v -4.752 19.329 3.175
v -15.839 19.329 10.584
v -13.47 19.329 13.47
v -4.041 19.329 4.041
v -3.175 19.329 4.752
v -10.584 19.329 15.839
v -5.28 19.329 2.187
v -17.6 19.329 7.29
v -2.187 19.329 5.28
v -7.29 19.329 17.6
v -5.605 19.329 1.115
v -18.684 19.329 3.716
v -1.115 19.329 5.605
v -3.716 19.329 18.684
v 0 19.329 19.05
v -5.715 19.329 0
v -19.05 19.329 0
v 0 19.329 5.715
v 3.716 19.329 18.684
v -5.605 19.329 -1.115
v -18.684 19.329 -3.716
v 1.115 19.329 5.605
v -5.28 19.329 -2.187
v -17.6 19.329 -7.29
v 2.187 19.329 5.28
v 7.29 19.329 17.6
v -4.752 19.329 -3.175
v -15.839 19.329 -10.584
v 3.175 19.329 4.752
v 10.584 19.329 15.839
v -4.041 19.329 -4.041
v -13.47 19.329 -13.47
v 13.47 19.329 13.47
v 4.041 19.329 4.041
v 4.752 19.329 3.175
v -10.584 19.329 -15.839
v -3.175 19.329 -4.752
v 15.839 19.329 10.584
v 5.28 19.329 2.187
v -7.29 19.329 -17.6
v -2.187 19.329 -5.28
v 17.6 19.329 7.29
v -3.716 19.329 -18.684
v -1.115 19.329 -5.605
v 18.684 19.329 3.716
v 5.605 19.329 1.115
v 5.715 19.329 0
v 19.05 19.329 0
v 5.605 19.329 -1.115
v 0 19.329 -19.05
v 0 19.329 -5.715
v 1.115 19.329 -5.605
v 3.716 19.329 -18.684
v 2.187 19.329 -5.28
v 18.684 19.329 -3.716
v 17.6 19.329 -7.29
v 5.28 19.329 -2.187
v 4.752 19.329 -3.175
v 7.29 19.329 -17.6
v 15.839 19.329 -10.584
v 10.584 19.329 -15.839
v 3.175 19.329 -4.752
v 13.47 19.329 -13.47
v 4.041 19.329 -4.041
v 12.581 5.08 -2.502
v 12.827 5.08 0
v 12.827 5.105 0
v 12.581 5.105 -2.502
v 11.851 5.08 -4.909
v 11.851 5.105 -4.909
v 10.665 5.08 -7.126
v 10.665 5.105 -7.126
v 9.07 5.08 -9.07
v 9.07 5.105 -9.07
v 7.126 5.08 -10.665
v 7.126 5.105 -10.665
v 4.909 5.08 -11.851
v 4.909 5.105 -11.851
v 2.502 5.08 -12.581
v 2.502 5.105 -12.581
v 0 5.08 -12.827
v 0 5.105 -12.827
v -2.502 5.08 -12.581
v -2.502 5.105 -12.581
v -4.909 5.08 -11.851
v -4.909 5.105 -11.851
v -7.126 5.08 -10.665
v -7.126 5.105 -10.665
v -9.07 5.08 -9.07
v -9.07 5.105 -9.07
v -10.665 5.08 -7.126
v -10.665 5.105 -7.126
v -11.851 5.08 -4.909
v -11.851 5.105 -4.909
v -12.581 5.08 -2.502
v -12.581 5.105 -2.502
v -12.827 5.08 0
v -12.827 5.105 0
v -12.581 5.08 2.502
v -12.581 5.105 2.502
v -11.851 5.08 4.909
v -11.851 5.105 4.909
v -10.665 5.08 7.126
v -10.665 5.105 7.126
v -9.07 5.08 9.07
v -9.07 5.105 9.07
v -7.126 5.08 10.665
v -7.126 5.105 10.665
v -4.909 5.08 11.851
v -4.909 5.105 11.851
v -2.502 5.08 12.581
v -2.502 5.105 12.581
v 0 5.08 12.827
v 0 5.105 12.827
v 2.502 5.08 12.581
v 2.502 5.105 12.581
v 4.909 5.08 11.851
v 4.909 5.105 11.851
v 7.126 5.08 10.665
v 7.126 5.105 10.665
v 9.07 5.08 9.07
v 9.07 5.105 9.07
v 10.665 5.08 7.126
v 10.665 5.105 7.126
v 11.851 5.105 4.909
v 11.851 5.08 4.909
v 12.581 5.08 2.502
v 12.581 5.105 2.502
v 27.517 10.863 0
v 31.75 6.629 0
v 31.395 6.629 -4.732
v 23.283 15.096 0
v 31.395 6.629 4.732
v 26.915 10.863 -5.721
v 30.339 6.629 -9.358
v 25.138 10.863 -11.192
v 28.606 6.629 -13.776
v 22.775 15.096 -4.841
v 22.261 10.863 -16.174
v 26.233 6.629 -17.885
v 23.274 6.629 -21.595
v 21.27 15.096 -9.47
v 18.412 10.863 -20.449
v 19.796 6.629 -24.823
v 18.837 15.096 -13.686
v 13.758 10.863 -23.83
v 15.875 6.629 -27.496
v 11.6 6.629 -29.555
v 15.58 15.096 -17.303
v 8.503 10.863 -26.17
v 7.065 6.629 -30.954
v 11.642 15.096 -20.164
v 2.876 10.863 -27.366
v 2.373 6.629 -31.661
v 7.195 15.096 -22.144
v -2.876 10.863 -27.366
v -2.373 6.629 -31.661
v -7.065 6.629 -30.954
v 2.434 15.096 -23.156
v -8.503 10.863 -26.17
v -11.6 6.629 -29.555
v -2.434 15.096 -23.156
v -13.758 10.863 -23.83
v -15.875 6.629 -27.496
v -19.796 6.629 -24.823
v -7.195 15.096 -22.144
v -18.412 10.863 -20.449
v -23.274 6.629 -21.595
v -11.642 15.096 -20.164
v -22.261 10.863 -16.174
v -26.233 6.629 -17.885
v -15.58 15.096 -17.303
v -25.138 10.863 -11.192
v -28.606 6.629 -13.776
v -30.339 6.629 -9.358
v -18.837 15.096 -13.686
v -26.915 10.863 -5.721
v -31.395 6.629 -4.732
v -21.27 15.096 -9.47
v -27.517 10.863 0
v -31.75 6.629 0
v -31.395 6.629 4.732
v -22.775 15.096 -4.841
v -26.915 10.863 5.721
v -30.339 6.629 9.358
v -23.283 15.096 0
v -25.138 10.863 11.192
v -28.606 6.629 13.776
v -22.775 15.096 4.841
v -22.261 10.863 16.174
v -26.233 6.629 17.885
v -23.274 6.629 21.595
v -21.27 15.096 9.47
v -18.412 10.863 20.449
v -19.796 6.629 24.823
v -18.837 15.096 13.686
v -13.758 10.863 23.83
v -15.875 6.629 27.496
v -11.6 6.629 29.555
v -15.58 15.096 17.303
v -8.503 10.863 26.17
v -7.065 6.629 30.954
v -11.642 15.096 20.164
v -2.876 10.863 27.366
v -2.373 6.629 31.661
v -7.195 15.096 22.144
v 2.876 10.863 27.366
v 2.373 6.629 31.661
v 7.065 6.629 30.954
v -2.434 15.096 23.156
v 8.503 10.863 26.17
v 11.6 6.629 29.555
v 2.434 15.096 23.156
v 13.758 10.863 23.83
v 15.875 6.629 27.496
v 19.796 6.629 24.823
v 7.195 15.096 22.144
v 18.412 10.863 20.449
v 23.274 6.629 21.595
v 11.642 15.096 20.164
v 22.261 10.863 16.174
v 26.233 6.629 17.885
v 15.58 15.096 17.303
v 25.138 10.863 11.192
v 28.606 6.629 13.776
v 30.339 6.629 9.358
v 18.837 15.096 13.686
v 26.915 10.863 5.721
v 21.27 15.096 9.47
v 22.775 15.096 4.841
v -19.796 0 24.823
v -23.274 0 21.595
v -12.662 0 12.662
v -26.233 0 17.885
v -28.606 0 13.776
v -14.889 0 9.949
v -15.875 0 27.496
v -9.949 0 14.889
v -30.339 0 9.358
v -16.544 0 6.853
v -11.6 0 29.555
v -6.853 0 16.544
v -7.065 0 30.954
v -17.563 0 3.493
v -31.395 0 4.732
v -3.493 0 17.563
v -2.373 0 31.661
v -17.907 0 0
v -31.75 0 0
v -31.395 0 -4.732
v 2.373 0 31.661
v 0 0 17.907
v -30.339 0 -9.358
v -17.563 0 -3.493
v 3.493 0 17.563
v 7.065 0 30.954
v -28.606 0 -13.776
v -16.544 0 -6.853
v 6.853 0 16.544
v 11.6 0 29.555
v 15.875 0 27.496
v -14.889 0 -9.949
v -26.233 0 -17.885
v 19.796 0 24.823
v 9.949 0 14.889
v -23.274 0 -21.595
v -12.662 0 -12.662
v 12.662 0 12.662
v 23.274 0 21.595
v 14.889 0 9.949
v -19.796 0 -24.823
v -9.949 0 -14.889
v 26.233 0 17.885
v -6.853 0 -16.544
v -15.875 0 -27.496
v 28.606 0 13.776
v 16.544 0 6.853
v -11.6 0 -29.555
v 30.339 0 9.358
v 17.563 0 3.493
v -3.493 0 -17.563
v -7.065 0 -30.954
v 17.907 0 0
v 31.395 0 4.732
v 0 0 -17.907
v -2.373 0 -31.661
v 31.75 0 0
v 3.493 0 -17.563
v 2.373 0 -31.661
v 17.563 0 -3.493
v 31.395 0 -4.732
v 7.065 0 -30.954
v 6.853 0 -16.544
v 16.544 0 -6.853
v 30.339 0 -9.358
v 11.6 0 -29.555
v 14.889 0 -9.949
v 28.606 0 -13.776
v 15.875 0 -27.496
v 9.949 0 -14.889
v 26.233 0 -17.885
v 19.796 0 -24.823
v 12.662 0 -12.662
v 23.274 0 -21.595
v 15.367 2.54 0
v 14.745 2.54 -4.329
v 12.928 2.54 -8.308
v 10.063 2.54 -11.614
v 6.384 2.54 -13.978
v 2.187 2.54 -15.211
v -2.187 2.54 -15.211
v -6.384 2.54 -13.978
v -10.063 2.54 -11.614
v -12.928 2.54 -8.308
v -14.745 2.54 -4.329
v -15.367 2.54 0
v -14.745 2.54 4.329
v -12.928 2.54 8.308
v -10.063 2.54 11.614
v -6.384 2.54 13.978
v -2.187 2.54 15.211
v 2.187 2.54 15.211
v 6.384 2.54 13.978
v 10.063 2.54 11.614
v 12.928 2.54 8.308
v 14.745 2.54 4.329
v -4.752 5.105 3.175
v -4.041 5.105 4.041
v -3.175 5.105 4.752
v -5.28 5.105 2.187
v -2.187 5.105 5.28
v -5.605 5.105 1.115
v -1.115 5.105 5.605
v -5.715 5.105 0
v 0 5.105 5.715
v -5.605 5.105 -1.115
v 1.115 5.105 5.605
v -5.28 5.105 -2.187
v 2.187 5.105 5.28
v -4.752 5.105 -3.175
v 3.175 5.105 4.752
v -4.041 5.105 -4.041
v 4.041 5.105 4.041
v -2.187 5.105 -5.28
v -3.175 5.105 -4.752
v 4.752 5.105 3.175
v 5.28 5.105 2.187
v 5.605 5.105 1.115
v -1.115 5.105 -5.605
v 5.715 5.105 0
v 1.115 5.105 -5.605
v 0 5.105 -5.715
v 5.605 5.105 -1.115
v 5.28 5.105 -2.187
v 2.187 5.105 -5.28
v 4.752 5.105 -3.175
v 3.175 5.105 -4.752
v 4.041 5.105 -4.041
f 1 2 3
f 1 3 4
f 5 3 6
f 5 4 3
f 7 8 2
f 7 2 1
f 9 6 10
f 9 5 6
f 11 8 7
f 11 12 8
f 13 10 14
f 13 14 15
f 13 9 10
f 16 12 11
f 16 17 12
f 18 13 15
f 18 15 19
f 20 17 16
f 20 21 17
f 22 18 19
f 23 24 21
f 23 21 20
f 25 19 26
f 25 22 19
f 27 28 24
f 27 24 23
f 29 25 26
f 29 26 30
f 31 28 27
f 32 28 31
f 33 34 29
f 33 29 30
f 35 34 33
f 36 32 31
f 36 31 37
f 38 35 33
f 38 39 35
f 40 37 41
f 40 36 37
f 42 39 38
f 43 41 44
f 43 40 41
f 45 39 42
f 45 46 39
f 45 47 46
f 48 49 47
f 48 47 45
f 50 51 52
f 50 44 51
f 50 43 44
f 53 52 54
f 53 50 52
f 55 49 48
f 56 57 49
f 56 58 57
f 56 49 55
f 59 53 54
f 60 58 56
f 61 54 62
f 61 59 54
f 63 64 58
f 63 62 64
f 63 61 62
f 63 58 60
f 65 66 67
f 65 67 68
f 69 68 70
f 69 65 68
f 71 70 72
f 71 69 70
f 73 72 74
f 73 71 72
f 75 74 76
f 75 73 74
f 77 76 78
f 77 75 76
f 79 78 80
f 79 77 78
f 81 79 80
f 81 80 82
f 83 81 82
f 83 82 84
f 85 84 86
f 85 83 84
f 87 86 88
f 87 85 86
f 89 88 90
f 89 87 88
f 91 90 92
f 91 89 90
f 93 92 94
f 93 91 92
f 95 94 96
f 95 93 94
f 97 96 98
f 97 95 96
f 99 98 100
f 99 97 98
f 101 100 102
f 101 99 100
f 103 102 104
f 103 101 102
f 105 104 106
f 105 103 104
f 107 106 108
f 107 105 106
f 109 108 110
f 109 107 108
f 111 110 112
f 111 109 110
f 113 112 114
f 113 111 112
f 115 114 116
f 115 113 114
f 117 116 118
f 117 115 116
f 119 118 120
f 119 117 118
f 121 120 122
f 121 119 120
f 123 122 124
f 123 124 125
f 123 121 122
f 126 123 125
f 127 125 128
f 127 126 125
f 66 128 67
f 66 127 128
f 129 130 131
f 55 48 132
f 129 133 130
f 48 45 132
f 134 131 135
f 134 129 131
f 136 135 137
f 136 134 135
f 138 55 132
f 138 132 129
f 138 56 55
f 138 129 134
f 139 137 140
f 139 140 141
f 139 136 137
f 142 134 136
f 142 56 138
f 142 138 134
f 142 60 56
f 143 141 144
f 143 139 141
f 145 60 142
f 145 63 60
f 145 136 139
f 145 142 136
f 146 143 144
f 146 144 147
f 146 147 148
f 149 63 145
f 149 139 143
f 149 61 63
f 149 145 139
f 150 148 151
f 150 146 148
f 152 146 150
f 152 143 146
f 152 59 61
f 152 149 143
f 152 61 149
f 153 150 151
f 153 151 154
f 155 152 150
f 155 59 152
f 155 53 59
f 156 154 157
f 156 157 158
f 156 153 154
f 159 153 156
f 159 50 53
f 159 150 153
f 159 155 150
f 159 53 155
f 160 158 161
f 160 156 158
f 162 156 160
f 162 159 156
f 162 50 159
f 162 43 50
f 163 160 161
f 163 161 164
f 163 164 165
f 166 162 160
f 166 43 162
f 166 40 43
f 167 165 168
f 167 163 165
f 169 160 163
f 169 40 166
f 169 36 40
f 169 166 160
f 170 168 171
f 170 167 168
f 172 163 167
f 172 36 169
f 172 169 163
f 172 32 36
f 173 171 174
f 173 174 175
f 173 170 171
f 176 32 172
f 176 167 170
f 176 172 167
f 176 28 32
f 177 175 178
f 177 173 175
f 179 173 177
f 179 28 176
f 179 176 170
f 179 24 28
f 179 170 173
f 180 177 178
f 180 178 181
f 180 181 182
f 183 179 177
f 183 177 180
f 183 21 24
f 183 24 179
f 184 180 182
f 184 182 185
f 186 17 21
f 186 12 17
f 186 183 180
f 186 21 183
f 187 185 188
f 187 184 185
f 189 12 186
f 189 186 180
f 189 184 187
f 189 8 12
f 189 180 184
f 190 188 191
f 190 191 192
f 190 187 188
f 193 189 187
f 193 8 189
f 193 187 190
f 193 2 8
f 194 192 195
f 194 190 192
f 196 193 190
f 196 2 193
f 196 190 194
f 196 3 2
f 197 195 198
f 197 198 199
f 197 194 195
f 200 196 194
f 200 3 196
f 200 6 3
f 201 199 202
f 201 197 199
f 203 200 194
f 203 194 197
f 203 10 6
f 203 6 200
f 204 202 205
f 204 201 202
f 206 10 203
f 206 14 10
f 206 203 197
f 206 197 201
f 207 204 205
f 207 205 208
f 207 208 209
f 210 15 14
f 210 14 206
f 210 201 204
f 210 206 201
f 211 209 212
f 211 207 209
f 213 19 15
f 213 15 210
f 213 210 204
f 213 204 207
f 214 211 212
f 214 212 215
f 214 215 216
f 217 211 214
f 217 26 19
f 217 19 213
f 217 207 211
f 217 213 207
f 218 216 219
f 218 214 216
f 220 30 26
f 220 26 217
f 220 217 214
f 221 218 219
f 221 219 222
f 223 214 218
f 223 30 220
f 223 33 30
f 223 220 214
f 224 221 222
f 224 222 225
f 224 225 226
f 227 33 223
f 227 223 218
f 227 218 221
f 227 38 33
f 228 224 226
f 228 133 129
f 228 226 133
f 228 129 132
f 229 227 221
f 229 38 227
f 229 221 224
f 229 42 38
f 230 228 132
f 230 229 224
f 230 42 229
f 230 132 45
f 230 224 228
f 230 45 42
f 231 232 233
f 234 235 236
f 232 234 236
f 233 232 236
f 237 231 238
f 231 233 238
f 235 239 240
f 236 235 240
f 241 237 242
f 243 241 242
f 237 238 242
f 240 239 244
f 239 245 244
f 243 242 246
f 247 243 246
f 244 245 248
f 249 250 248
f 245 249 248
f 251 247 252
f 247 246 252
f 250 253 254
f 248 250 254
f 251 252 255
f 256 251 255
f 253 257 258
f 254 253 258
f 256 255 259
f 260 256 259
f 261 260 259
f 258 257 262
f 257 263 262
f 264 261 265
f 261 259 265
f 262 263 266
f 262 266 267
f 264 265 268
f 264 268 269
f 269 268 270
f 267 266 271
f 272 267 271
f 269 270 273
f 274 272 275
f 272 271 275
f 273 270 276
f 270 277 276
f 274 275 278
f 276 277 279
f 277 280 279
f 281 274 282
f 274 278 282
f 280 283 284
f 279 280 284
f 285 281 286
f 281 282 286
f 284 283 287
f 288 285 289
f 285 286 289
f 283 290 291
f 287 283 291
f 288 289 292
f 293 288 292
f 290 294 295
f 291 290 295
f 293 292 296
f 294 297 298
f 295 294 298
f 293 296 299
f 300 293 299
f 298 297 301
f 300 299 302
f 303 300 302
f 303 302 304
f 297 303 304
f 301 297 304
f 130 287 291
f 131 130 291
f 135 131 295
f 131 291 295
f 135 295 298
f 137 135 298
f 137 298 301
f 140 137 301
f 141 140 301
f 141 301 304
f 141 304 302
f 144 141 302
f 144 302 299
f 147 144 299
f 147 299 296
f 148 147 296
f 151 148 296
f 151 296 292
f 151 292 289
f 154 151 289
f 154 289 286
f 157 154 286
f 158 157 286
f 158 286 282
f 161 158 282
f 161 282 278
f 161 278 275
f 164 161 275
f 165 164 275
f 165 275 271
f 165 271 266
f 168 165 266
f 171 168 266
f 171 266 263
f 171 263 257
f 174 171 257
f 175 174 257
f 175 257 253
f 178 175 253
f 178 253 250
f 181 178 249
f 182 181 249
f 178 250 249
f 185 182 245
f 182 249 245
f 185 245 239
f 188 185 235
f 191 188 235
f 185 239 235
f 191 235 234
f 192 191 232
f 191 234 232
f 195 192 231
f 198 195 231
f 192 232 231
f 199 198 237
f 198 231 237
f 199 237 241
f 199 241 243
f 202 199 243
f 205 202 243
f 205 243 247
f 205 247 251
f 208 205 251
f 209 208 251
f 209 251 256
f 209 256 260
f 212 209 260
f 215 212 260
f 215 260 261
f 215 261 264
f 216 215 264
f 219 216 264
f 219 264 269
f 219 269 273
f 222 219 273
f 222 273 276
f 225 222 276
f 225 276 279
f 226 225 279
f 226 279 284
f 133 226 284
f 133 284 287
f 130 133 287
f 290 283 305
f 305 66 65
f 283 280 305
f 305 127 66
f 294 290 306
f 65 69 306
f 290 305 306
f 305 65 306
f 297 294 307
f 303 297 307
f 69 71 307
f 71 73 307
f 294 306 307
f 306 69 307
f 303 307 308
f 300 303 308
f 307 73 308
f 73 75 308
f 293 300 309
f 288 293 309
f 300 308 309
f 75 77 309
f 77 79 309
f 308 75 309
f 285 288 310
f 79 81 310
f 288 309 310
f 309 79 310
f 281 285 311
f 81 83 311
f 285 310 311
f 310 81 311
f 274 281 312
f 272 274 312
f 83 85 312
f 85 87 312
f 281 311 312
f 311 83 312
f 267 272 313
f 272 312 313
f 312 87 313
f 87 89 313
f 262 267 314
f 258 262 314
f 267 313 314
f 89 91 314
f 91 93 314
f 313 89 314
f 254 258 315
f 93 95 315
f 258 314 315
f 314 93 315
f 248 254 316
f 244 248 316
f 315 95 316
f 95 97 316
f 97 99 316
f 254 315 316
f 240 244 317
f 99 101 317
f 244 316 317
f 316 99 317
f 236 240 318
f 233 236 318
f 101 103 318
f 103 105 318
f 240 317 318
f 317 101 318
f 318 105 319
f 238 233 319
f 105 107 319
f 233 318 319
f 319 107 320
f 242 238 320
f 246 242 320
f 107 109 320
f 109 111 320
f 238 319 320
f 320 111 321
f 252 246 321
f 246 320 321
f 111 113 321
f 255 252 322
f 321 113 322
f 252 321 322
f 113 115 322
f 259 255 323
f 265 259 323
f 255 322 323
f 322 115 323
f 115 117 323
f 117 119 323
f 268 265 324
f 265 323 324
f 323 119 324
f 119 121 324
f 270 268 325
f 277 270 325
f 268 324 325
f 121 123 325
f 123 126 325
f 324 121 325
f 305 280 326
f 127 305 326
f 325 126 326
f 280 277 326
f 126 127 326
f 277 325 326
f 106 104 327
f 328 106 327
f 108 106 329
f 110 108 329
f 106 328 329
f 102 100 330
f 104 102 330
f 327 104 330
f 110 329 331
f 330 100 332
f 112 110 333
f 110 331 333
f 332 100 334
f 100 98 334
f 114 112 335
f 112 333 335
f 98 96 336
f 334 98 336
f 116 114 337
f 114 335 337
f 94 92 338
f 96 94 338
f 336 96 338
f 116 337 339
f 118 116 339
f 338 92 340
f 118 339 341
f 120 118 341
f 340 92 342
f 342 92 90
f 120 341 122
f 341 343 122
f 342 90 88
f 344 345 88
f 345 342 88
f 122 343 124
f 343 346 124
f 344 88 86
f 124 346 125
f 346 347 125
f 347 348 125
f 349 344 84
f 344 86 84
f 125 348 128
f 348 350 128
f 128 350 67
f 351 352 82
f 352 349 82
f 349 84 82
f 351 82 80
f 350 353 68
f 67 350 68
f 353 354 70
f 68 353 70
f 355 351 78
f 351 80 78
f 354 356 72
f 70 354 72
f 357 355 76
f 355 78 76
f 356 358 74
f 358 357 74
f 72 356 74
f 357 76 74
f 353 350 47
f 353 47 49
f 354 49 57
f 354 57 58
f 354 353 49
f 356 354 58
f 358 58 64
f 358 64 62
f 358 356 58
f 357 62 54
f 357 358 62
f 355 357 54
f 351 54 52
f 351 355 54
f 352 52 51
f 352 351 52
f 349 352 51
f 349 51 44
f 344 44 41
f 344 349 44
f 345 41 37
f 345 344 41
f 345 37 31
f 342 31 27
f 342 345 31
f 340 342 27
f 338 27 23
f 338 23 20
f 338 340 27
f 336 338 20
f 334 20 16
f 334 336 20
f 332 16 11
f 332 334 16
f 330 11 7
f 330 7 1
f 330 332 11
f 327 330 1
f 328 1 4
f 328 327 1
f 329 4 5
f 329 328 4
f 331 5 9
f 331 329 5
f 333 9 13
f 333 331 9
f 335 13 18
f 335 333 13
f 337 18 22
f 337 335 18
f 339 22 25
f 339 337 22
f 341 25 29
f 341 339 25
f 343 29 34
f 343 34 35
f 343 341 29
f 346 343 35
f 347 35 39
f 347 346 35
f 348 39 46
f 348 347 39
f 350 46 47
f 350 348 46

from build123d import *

# Parameters (mm, degrees)
SKETCH1_R           = 31.75
SKETCH1_R_2         = 12.827
BOSS_EXTRUDE1_DEPTH = 5.1054
SKETCH2_R           = 31.75
SKETCH2_R_2         = 5.715
BOSS_EXTRUDE2_DEPTH = 14.224
CHAMFER1_SIZE       = 5.08
CHAMFER2_SIZE       = 12.7


with BuildPart() as part:
    # Sketch1 → Boss-Extrude1 (new body)
    with BuildSketch(Plane(origin=(0, 0, 0), x_dir=(1, 0, 0), z_dir=(0, 1, 0))):
        Circle(SKETCH1_R)
        Circle(SKETCH1_R_2, mode=Mode.SUBTRACT)
    extrude(amount=BOSS_EXTRUDE1_DEPTH)

    # Sketch2 → Boss-Extrude2 (add)
    with BuildSketch(Plane(origin=(0, 5.1054, 0), x_dir=(1, 0, 0), z_dir=(0, 1, 0))):
        Circle(SKETCH2_R)
        Circle(SKETCH2_R_2, mode=Mode.SUBTRACT)
    extrude(amount=BOSS_EXTRUDE2_DEPTH)

    # Chamfer1
    chamfer1_edges = [part.edges().sort_by_distance(p)[0] for p in [
        (-12.827, 0, 0),
    ]]
    chamfer(chamfer1_edges, length=CHAMFER1_SIZE)

    # Chamfer2
    chamfer2_edges = [part.edges().sort_by_distance(p)[0] for p in [
        (-31.75, 19.3294, 0),
    ]]
    chamfer(chamfer2_edges, length=CHAMFER2_SIZE)


solid = part.part
